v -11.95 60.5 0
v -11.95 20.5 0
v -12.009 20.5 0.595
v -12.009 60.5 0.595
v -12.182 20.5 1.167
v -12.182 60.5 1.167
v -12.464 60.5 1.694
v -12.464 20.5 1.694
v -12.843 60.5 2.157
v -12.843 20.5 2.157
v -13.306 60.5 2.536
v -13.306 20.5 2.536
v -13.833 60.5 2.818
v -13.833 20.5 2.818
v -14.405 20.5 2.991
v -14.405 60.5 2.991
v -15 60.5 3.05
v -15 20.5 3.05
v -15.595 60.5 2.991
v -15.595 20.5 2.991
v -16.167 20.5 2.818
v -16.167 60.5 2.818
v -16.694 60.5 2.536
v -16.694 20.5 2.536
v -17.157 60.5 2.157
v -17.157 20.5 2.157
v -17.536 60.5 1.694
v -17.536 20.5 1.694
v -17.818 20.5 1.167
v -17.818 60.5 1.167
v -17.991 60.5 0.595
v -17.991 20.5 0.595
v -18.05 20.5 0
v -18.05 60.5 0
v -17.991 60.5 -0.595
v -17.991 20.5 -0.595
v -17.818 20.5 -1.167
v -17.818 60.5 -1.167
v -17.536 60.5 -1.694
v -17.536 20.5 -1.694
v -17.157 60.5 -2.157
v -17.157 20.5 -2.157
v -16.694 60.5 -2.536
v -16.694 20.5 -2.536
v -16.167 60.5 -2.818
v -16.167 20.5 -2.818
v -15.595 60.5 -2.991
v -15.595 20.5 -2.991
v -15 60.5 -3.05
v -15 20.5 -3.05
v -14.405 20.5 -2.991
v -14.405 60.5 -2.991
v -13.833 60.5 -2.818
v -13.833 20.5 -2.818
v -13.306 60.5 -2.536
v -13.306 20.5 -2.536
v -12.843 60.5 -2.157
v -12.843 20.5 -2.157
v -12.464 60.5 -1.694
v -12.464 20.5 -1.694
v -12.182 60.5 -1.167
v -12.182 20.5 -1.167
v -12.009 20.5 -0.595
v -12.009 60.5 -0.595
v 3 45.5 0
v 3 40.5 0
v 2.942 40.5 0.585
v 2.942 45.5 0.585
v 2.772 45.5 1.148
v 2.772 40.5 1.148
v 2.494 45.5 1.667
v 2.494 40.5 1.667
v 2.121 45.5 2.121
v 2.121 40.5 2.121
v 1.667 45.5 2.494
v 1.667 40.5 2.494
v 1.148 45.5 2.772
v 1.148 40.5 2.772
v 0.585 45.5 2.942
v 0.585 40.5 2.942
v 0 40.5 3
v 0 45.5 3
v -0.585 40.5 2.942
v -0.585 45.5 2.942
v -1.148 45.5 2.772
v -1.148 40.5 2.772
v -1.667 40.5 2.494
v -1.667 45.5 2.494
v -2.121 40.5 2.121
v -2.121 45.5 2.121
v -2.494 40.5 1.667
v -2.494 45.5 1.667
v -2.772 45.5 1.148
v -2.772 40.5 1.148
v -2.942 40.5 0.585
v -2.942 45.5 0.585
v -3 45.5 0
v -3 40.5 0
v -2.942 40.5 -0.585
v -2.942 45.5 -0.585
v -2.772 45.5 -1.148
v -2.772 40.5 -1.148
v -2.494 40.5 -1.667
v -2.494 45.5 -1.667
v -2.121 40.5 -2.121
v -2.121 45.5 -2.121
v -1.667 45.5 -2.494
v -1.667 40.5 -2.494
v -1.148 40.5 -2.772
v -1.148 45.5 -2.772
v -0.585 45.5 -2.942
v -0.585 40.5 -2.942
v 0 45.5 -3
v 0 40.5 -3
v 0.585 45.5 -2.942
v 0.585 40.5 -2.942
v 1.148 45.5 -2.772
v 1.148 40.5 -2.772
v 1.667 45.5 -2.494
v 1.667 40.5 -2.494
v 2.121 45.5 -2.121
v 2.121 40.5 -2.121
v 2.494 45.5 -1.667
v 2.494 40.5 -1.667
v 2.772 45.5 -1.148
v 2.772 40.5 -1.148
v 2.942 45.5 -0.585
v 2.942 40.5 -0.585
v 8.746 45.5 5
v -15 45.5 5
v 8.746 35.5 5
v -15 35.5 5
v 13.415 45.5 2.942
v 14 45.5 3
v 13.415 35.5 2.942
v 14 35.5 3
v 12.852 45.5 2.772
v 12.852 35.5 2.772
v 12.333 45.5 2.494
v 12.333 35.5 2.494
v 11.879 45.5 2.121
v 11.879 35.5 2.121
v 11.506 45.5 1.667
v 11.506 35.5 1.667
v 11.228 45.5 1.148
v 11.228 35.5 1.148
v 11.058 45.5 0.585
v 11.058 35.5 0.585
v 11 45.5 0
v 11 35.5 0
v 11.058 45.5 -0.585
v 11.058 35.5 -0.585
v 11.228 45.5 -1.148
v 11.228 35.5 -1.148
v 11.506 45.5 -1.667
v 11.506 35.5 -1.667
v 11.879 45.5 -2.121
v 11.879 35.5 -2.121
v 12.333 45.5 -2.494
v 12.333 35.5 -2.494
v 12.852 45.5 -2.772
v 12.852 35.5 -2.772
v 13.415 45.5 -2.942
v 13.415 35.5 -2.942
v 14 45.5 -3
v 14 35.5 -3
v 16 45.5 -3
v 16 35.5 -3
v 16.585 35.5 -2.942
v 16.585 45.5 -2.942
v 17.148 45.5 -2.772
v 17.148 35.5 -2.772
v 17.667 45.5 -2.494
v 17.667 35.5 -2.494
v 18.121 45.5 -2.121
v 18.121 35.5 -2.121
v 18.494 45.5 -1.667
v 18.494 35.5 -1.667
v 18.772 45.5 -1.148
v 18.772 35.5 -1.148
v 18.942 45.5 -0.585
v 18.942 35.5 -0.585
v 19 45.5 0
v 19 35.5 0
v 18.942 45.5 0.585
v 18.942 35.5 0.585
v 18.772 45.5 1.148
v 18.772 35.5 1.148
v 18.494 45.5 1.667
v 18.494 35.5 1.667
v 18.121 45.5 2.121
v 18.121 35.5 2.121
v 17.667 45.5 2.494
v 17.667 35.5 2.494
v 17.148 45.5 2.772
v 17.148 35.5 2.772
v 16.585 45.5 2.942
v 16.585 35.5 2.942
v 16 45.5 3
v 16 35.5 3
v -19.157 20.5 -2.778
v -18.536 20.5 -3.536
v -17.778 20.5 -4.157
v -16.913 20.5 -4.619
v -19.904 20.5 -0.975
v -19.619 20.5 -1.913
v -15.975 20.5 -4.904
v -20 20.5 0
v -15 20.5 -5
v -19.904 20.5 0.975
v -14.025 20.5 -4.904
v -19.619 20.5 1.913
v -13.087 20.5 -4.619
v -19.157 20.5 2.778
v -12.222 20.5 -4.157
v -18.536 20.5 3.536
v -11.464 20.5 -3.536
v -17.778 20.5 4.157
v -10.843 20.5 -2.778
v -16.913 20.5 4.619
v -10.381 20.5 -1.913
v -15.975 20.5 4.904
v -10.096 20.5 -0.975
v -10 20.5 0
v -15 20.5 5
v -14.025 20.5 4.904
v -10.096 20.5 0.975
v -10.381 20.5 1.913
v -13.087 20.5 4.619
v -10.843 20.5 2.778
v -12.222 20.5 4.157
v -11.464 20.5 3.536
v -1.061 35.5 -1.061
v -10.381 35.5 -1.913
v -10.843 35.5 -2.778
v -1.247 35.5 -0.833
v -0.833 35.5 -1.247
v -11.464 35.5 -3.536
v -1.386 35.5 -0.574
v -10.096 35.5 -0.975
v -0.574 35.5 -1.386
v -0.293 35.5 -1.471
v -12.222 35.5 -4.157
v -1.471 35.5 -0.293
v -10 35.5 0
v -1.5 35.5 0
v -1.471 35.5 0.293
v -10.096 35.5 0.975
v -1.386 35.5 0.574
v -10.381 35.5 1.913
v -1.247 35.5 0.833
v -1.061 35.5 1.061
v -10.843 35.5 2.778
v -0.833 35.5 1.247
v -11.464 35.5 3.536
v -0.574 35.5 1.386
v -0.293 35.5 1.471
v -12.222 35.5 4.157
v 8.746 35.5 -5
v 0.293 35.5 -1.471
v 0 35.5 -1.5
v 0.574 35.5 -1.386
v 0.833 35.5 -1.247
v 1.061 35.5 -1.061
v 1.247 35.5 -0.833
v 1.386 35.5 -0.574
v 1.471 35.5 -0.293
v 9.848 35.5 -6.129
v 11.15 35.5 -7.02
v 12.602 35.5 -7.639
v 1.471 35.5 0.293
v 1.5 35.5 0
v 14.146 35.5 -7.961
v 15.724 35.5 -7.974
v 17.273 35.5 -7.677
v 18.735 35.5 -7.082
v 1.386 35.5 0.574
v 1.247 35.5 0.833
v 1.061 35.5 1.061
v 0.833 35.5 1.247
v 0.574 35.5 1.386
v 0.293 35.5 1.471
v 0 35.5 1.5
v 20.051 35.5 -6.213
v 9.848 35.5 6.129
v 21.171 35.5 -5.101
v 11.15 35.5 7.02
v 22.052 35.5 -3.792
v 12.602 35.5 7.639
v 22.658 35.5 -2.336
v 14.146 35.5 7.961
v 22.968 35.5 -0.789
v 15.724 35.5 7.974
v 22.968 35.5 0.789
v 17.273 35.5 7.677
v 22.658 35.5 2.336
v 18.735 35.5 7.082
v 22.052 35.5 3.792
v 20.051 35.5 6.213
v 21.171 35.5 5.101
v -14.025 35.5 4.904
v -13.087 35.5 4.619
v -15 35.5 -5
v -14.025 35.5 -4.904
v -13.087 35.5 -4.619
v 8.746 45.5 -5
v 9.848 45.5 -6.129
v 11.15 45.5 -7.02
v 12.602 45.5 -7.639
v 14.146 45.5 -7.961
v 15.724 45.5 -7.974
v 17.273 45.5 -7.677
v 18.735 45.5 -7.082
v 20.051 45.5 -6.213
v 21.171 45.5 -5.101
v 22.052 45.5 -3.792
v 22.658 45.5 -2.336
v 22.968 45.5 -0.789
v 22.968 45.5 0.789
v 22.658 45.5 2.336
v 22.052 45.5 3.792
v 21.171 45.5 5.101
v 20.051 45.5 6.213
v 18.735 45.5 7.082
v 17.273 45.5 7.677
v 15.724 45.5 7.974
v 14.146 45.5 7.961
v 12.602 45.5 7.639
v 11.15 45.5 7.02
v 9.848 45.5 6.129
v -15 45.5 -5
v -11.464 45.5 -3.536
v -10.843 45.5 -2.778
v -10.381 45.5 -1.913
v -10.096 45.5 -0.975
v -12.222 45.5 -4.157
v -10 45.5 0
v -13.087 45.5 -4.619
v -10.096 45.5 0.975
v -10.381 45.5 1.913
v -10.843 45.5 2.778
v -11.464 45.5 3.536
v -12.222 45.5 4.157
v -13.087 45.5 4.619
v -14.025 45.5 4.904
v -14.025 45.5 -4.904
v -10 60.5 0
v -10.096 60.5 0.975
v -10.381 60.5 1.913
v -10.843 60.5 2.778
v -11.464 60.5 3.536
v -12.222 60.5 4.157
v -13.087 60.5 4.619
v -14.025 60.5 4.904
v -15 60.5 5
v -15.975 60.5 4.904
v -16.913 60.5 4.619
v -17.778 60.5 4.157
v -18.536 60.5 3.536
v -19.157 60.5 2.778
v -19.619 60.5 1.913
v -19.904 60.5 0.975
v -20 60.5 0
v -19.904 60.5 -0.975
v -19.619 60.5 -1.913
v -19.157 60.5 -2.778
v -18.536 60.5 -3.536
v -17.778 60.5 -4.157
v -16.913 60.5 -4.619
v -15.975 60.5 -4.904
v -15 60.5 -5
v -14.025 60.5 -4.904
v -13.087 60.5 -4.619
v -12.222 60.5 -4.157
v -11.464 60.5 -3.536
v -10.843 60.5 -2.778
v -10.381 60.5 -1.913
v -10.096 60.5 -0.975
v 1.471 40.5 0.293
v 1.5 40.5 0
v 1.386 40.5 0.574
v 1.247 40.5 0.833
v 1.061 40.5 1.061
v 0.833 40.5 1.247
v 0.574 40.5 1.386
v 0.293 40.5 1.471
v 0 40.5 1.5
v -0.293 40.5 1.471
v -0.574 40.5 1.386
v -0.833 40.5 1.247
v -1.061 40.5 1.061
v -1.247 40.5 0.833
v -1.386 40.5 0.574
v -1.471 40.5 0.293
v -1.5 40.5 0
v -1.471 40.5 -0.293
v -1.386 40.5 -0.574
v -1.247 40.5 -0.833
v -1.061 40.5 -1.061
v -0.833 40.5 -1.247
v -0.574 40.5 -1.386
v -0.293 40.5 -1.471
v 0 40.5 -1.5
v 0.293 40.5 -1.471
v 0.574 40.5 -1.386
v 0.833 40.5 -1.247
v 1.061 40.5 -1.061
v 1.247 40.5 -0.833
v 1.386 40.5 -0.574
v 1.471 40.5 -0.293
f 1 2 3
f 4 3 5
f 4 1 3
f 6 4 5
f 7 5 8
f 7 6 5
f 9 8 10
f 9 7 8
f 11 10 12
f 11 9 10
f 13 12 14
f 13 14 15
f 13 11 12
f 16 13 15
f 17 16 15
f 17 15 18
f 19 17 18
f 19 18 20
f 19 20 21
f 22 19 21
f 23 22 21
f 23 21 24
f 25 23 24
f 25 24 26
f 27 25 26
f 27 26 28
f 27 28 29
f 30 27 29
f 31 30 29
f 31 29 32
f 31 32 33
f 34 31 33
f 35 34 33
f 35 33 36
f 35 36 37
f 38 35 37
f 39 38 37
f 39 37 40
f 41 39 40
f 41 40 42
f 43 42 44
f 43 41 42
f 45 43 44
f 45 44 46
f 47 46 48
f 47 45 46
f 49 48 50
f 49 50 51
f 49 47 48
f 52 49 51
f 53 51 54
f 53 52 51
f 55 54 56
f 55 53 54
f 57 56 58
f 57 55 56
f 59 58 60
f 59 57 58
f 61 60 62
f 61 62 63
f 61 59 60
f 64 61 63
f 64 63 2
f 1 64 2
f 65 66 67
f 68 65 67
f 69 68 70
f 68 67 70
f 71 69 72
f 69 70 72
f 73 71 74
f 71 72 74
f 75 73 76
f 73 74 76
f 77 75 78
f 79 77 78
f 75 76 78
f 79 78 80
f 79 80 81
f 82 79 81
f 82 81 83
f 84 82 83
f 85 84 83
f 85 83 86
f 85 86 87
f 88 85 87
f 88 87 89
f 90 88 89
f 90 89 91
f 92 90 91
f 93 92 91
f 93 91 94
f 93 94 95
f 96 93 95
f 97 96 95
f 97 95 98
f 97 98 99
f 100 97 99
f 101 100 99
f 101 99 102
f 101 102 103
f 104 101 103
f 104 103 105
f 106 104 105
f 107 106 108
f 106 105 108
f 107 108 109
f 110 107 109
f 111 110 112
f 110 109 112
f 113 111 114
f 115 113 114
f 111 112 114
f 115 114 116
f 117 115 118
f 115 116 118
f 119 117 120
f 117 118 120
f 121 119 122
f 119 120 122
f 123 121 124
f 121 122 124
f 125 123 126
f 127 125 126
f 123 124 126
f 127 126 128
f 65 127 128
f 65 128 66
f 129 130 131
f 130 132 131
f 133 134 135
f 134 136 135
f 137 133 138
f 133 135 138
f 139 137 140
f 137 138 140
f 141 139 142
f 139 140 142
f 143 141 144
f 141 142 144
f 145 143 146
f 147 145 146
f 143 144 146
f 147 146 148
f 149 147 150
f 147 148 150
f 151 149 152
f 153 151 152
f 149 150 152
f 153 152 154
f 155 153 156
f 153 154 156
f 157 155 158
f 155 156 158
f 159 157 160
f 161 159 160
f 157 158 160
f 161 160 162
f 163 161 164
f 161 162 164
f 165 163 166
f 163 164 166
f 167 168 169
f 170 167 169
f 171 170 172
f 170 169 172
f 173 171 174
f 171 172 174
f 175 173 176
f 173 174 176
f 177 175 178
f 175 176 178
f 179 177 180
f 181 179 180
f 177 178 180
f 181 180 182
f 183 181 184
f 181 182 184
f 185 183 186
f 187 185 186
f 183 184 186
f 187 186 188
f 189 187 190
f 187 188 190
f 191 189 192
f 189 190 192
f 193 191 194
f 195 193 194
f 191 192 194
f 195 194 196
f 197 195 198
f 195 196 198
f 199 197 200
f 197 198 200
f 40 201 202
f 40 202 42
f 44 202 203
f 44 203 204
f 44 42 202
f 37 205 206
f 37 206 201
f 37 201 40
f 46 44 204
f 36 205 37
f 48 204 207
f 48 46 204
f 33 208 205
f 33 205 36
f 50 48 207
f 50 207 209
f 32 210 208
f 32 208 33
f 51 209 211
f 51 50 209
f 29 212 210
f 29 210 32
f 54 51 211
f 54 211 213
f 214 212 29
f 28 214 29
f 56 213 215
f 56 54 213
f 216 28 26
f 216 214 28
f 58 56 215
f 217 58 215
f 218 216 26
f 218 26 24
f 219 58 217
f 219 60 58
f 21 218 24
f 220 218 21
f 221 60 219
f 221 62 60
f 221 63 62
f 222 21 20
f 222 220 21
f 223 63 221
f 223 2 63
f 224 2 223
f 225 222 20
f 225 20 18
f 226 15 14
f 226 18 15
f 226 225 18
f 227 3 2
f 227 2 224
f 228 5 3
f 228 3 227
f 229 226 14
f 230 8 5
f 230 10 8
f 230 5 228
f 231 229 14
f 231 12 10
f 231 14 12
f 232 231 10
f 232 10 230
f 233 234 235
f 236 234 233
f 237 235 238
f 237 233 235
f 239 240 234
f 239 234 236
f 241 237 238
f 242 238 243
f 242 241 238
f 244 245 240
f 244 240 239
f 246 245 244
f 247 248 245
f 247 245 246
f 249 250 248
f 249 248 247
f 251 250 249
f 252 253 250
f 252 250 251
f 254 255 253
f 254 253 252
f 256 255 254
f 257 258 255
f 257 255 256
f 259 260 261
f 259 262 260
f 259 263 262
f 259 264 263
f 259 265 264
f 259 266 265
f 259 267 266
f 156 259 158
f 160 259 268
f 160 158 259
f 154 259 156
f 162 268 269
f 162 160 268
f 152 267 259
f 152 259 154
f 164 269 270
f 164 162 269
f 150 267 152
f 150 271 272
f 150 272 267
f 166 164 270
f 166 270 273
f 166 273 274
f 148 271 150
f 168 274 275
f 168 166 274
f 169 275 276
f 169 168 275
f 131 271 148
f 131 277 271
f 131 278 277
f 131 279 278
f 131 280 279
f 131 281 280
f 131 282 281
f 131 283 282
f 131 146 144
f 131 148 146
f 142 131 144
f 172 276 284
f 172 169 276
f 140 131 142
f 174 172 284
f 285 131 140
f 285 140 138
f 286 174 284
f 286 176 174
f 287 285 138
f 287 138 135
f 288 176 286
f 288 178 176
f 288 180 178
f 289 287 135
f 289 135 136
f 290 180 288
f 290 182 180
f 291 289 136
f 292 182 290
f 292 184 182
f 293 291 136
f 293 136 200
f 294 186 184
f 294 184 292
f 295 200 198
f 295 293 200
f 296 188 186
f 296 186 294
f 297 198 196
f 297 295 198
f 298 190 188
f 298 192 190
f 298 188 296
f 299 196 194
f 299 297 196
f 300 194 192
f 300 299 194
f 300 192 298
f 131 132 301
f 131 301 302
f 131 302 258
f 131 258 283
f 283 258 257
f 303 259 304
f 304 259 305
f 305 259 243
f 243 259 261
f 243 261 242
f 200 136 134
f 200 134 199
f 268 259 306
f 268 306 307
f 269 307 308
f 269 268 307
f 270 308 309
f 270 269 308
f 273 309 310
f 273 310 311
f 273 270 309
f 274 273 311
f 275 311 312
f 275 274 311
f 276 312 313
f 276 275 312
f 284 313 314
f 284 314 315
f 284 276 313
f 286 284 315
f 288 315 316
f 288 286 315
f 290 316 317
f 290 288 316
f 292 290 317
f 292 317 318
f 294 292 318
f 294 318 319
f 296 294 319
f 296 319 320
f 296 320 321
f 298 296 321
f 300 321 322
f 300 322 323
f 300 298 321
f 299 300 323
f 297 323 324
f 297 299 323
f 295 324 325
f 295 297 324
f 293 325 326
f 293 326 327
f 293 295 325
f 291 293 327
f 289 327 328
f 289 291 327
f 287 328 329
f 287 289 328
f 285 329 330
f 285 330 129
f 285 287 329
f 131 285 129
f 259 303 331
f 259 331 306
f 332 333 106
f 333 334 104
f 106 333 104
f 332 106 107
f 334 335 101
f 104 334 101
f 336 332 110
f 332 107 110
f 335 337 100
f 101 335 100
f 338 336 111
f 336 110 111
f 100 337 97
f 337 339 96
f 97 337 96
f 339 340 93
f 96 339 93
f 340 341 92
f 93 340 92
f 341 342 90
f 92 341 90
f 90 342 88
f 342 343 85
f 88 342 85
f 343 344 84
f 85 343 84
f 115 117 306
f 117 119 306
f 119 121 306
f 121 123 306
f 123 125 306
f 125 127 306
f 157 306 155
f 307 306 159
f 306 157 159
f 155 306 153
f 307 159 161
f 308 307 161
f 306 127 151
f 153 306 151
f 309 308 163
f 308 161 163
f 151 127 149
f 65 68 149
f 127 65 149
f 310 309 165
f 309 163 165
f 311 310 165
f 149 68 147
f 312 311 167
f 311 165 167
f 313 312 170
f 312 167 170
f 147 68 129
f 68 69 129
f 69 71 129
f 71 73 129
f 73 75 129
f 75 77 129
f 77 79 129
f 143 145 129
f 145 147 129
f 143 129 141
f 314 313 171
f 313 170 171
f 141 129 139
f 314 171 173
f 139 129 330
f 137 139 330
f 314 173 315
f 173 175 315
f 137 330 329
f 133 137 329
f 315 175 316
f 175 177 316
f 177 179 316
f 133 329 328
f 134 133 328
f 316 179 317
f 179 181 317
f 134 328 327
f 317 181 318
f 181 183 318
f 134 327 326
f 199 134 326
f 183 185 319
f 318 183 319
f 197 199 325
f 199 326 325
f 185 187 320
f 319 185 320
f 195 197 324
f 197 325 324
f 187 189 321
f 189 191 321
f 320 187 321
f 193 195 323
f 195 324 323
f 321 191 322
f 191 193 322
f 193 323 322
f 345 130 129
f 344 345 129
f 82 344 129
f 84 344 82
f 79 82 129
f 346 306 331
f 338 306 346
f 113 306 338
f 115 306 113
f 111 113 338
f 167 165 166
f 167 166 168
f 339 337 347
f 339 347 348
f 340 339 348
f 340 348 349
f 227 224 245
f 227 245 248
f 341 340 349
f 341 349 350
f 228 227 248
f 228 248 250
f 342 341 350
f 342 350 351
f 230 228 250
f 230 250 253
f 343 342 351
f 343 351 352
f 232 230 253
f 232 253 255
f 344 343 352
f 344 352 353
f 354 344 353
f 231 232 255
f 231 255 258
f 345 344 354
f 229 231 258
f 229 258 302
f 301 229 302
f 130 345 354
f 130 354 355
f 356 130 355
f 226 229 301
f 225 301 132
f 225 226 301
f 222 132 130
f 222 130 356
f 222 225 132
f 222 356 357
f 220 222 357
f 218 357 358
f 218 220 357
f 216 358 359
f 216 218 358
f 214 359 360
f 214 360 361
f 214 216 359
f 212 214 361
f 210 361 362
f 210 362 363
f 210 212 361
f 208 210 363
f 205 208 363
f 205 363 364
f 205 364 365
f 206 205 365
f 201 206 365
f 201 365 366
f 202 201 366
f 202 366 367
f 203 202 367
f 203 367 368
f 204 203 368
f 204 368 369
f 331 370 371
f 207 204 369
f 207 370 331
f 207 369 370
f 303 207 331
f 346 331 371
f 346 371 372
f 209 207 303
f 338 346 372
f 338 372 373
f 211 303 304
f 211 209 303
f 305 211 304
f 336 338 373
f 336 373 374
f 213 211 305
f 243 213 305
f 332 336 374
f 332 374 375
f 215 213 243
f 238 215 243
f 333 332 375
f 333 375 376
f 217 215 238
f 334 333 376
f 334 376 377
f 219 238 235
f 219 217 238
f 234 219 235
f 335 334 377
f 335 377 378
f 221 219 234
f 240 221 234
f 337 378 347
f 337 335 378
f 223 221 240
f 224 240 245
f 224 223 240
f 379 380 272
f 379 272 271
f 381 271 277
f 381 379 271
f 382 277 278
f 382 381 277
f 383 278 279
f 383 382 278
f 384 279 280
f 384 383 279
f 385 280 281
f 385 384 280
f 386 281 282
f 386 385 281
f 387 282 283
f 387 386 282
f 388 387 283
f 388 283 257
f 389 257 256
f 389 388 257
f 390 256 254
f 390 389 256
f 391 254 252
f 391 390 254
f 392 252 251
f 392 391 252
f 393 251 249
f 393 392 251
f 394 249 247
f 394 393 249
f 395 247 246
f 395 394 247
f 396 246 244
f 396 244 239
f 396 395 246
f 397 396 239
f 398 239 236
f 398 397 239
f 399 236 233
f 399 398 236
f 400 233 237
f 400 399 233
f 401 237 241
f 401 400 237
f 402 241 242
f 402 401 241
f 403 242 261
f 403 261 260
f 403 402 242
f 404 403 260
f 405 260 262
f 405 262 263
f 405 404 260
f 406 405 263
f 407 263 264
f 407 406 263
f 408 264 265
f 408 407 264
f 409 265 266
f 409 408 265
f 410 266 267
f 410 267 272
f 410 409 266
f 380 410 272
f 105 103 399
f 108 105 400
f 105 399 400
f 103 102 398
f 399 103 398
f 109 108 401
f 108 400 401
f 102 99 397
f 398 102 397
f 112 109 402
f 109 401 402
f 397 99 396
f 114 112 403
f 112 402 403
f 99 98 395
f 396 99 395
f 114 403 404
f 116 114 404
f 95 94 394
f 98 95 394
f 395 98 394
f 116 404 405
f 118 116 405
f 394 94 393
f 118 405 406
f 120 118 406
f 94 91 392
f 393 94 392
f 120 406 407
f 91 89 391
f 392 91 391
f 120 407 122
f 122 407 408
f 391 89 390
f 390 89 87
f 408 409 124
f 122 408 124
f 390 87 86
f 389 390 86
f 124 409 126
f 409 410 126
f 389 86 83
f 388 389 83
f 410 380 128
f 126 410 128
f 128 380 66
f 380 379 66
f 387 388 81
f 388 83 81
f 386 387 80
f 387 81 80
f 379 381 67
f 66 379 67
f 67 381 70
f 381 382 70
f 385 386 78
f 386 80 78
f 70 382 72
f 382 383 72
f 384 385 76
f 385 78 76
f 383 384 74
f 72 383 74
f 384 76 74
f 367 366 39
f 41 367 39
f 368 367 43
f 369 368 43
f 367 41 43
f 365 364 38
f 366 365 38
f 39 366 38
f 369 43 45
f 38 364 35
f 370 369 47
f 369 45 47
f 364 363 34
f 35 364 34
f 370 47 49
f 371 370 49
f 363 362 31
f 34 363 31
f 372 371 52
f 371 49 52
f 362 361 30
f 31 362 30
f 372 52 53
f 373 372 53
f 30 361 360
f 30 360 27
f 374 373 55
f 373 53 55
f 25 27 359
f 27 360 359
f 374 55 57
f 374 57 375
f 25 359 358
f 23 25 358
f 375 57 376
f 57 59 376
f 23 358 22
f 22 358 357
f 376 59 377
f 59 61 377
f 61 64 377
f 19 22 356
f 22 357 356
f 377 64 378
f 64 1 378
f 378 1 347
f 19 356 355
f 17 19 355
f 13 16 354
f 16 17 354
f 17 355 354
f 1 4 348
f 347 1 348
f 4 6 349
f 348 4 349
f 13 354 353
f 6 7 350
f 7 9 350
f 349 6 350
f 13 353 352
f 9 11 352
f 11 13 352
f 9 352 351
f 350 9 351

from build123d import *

# Parameters (mm, degrees)
SKETCH008_R     = 3.05
SKETCH008_R_2   = 1.5
PAD003_DEPTH    = 5
SKETCH009_R     = 5
SKETCH009_R_2   = 3.05
PAD004_DEPTH    = 20
SKETCH011_R     = 3
POCKET004_DEPTH = 10


with BuildPart() as part:
    # Sketch008 → Pad003 (new body, symmetric)
    with BuildSketch(Plane.XZ):
        with BuildLine():
            ThreePointArc((-15, 5), (-20, 0), (-15, -5))
            Line((-15, -5), (8.746454, -5))
            ThreePointArc((8.746454, -5), (23.006674, 0), (8.746454, 5))
            Line((-15, 5), (8.746454, 5))
        make_face()
        with Locations((-15, 0)):
            Circle(SKETCH008_R, mode=Mode.SUBTRACT)
        Circle(SKETCH008_R_2, mode=Mode.SUBTRACT)
        with BuildLine():
            ThreePointArc((14, 3), (11, 0), (14, -3))
            Line((14, -3), (16, -3))
            ThreePointArc((16, -3), (19, 0), (16, 3))
            Line((14, 3), (16, 3))
        make_face(mode=Mode.SUBTRACT)
    extrude(amount=PAD003_DEPTH, both=True)

    # Sketch009 → Pad004 (join, symmetric)
    with BuildSketch(Plane.XZ):
        with Locations((-15, 0)):
            Circle(SKETCH009_R)
        with Locations((-15, 0)):
            Circle(SKETCH009_R_2, mode=Mode.SUBTRACT)
    extrude(amount=PAD004_DEPTH, both=True)

    # Sketch011 → Pocket004 (cut)
    with BuildSketch(Plane.XZ):
        Circle(SKETCH011_R)
    extrude(amount=-POCKET004_DEPTH, mode=Mode.SUBTRACT)


with BuildPart() as part_1:
    # Body017 placement: moved
    add(part.part.moved(Location((0, 40.5, 0))))


solid = part_1.part
